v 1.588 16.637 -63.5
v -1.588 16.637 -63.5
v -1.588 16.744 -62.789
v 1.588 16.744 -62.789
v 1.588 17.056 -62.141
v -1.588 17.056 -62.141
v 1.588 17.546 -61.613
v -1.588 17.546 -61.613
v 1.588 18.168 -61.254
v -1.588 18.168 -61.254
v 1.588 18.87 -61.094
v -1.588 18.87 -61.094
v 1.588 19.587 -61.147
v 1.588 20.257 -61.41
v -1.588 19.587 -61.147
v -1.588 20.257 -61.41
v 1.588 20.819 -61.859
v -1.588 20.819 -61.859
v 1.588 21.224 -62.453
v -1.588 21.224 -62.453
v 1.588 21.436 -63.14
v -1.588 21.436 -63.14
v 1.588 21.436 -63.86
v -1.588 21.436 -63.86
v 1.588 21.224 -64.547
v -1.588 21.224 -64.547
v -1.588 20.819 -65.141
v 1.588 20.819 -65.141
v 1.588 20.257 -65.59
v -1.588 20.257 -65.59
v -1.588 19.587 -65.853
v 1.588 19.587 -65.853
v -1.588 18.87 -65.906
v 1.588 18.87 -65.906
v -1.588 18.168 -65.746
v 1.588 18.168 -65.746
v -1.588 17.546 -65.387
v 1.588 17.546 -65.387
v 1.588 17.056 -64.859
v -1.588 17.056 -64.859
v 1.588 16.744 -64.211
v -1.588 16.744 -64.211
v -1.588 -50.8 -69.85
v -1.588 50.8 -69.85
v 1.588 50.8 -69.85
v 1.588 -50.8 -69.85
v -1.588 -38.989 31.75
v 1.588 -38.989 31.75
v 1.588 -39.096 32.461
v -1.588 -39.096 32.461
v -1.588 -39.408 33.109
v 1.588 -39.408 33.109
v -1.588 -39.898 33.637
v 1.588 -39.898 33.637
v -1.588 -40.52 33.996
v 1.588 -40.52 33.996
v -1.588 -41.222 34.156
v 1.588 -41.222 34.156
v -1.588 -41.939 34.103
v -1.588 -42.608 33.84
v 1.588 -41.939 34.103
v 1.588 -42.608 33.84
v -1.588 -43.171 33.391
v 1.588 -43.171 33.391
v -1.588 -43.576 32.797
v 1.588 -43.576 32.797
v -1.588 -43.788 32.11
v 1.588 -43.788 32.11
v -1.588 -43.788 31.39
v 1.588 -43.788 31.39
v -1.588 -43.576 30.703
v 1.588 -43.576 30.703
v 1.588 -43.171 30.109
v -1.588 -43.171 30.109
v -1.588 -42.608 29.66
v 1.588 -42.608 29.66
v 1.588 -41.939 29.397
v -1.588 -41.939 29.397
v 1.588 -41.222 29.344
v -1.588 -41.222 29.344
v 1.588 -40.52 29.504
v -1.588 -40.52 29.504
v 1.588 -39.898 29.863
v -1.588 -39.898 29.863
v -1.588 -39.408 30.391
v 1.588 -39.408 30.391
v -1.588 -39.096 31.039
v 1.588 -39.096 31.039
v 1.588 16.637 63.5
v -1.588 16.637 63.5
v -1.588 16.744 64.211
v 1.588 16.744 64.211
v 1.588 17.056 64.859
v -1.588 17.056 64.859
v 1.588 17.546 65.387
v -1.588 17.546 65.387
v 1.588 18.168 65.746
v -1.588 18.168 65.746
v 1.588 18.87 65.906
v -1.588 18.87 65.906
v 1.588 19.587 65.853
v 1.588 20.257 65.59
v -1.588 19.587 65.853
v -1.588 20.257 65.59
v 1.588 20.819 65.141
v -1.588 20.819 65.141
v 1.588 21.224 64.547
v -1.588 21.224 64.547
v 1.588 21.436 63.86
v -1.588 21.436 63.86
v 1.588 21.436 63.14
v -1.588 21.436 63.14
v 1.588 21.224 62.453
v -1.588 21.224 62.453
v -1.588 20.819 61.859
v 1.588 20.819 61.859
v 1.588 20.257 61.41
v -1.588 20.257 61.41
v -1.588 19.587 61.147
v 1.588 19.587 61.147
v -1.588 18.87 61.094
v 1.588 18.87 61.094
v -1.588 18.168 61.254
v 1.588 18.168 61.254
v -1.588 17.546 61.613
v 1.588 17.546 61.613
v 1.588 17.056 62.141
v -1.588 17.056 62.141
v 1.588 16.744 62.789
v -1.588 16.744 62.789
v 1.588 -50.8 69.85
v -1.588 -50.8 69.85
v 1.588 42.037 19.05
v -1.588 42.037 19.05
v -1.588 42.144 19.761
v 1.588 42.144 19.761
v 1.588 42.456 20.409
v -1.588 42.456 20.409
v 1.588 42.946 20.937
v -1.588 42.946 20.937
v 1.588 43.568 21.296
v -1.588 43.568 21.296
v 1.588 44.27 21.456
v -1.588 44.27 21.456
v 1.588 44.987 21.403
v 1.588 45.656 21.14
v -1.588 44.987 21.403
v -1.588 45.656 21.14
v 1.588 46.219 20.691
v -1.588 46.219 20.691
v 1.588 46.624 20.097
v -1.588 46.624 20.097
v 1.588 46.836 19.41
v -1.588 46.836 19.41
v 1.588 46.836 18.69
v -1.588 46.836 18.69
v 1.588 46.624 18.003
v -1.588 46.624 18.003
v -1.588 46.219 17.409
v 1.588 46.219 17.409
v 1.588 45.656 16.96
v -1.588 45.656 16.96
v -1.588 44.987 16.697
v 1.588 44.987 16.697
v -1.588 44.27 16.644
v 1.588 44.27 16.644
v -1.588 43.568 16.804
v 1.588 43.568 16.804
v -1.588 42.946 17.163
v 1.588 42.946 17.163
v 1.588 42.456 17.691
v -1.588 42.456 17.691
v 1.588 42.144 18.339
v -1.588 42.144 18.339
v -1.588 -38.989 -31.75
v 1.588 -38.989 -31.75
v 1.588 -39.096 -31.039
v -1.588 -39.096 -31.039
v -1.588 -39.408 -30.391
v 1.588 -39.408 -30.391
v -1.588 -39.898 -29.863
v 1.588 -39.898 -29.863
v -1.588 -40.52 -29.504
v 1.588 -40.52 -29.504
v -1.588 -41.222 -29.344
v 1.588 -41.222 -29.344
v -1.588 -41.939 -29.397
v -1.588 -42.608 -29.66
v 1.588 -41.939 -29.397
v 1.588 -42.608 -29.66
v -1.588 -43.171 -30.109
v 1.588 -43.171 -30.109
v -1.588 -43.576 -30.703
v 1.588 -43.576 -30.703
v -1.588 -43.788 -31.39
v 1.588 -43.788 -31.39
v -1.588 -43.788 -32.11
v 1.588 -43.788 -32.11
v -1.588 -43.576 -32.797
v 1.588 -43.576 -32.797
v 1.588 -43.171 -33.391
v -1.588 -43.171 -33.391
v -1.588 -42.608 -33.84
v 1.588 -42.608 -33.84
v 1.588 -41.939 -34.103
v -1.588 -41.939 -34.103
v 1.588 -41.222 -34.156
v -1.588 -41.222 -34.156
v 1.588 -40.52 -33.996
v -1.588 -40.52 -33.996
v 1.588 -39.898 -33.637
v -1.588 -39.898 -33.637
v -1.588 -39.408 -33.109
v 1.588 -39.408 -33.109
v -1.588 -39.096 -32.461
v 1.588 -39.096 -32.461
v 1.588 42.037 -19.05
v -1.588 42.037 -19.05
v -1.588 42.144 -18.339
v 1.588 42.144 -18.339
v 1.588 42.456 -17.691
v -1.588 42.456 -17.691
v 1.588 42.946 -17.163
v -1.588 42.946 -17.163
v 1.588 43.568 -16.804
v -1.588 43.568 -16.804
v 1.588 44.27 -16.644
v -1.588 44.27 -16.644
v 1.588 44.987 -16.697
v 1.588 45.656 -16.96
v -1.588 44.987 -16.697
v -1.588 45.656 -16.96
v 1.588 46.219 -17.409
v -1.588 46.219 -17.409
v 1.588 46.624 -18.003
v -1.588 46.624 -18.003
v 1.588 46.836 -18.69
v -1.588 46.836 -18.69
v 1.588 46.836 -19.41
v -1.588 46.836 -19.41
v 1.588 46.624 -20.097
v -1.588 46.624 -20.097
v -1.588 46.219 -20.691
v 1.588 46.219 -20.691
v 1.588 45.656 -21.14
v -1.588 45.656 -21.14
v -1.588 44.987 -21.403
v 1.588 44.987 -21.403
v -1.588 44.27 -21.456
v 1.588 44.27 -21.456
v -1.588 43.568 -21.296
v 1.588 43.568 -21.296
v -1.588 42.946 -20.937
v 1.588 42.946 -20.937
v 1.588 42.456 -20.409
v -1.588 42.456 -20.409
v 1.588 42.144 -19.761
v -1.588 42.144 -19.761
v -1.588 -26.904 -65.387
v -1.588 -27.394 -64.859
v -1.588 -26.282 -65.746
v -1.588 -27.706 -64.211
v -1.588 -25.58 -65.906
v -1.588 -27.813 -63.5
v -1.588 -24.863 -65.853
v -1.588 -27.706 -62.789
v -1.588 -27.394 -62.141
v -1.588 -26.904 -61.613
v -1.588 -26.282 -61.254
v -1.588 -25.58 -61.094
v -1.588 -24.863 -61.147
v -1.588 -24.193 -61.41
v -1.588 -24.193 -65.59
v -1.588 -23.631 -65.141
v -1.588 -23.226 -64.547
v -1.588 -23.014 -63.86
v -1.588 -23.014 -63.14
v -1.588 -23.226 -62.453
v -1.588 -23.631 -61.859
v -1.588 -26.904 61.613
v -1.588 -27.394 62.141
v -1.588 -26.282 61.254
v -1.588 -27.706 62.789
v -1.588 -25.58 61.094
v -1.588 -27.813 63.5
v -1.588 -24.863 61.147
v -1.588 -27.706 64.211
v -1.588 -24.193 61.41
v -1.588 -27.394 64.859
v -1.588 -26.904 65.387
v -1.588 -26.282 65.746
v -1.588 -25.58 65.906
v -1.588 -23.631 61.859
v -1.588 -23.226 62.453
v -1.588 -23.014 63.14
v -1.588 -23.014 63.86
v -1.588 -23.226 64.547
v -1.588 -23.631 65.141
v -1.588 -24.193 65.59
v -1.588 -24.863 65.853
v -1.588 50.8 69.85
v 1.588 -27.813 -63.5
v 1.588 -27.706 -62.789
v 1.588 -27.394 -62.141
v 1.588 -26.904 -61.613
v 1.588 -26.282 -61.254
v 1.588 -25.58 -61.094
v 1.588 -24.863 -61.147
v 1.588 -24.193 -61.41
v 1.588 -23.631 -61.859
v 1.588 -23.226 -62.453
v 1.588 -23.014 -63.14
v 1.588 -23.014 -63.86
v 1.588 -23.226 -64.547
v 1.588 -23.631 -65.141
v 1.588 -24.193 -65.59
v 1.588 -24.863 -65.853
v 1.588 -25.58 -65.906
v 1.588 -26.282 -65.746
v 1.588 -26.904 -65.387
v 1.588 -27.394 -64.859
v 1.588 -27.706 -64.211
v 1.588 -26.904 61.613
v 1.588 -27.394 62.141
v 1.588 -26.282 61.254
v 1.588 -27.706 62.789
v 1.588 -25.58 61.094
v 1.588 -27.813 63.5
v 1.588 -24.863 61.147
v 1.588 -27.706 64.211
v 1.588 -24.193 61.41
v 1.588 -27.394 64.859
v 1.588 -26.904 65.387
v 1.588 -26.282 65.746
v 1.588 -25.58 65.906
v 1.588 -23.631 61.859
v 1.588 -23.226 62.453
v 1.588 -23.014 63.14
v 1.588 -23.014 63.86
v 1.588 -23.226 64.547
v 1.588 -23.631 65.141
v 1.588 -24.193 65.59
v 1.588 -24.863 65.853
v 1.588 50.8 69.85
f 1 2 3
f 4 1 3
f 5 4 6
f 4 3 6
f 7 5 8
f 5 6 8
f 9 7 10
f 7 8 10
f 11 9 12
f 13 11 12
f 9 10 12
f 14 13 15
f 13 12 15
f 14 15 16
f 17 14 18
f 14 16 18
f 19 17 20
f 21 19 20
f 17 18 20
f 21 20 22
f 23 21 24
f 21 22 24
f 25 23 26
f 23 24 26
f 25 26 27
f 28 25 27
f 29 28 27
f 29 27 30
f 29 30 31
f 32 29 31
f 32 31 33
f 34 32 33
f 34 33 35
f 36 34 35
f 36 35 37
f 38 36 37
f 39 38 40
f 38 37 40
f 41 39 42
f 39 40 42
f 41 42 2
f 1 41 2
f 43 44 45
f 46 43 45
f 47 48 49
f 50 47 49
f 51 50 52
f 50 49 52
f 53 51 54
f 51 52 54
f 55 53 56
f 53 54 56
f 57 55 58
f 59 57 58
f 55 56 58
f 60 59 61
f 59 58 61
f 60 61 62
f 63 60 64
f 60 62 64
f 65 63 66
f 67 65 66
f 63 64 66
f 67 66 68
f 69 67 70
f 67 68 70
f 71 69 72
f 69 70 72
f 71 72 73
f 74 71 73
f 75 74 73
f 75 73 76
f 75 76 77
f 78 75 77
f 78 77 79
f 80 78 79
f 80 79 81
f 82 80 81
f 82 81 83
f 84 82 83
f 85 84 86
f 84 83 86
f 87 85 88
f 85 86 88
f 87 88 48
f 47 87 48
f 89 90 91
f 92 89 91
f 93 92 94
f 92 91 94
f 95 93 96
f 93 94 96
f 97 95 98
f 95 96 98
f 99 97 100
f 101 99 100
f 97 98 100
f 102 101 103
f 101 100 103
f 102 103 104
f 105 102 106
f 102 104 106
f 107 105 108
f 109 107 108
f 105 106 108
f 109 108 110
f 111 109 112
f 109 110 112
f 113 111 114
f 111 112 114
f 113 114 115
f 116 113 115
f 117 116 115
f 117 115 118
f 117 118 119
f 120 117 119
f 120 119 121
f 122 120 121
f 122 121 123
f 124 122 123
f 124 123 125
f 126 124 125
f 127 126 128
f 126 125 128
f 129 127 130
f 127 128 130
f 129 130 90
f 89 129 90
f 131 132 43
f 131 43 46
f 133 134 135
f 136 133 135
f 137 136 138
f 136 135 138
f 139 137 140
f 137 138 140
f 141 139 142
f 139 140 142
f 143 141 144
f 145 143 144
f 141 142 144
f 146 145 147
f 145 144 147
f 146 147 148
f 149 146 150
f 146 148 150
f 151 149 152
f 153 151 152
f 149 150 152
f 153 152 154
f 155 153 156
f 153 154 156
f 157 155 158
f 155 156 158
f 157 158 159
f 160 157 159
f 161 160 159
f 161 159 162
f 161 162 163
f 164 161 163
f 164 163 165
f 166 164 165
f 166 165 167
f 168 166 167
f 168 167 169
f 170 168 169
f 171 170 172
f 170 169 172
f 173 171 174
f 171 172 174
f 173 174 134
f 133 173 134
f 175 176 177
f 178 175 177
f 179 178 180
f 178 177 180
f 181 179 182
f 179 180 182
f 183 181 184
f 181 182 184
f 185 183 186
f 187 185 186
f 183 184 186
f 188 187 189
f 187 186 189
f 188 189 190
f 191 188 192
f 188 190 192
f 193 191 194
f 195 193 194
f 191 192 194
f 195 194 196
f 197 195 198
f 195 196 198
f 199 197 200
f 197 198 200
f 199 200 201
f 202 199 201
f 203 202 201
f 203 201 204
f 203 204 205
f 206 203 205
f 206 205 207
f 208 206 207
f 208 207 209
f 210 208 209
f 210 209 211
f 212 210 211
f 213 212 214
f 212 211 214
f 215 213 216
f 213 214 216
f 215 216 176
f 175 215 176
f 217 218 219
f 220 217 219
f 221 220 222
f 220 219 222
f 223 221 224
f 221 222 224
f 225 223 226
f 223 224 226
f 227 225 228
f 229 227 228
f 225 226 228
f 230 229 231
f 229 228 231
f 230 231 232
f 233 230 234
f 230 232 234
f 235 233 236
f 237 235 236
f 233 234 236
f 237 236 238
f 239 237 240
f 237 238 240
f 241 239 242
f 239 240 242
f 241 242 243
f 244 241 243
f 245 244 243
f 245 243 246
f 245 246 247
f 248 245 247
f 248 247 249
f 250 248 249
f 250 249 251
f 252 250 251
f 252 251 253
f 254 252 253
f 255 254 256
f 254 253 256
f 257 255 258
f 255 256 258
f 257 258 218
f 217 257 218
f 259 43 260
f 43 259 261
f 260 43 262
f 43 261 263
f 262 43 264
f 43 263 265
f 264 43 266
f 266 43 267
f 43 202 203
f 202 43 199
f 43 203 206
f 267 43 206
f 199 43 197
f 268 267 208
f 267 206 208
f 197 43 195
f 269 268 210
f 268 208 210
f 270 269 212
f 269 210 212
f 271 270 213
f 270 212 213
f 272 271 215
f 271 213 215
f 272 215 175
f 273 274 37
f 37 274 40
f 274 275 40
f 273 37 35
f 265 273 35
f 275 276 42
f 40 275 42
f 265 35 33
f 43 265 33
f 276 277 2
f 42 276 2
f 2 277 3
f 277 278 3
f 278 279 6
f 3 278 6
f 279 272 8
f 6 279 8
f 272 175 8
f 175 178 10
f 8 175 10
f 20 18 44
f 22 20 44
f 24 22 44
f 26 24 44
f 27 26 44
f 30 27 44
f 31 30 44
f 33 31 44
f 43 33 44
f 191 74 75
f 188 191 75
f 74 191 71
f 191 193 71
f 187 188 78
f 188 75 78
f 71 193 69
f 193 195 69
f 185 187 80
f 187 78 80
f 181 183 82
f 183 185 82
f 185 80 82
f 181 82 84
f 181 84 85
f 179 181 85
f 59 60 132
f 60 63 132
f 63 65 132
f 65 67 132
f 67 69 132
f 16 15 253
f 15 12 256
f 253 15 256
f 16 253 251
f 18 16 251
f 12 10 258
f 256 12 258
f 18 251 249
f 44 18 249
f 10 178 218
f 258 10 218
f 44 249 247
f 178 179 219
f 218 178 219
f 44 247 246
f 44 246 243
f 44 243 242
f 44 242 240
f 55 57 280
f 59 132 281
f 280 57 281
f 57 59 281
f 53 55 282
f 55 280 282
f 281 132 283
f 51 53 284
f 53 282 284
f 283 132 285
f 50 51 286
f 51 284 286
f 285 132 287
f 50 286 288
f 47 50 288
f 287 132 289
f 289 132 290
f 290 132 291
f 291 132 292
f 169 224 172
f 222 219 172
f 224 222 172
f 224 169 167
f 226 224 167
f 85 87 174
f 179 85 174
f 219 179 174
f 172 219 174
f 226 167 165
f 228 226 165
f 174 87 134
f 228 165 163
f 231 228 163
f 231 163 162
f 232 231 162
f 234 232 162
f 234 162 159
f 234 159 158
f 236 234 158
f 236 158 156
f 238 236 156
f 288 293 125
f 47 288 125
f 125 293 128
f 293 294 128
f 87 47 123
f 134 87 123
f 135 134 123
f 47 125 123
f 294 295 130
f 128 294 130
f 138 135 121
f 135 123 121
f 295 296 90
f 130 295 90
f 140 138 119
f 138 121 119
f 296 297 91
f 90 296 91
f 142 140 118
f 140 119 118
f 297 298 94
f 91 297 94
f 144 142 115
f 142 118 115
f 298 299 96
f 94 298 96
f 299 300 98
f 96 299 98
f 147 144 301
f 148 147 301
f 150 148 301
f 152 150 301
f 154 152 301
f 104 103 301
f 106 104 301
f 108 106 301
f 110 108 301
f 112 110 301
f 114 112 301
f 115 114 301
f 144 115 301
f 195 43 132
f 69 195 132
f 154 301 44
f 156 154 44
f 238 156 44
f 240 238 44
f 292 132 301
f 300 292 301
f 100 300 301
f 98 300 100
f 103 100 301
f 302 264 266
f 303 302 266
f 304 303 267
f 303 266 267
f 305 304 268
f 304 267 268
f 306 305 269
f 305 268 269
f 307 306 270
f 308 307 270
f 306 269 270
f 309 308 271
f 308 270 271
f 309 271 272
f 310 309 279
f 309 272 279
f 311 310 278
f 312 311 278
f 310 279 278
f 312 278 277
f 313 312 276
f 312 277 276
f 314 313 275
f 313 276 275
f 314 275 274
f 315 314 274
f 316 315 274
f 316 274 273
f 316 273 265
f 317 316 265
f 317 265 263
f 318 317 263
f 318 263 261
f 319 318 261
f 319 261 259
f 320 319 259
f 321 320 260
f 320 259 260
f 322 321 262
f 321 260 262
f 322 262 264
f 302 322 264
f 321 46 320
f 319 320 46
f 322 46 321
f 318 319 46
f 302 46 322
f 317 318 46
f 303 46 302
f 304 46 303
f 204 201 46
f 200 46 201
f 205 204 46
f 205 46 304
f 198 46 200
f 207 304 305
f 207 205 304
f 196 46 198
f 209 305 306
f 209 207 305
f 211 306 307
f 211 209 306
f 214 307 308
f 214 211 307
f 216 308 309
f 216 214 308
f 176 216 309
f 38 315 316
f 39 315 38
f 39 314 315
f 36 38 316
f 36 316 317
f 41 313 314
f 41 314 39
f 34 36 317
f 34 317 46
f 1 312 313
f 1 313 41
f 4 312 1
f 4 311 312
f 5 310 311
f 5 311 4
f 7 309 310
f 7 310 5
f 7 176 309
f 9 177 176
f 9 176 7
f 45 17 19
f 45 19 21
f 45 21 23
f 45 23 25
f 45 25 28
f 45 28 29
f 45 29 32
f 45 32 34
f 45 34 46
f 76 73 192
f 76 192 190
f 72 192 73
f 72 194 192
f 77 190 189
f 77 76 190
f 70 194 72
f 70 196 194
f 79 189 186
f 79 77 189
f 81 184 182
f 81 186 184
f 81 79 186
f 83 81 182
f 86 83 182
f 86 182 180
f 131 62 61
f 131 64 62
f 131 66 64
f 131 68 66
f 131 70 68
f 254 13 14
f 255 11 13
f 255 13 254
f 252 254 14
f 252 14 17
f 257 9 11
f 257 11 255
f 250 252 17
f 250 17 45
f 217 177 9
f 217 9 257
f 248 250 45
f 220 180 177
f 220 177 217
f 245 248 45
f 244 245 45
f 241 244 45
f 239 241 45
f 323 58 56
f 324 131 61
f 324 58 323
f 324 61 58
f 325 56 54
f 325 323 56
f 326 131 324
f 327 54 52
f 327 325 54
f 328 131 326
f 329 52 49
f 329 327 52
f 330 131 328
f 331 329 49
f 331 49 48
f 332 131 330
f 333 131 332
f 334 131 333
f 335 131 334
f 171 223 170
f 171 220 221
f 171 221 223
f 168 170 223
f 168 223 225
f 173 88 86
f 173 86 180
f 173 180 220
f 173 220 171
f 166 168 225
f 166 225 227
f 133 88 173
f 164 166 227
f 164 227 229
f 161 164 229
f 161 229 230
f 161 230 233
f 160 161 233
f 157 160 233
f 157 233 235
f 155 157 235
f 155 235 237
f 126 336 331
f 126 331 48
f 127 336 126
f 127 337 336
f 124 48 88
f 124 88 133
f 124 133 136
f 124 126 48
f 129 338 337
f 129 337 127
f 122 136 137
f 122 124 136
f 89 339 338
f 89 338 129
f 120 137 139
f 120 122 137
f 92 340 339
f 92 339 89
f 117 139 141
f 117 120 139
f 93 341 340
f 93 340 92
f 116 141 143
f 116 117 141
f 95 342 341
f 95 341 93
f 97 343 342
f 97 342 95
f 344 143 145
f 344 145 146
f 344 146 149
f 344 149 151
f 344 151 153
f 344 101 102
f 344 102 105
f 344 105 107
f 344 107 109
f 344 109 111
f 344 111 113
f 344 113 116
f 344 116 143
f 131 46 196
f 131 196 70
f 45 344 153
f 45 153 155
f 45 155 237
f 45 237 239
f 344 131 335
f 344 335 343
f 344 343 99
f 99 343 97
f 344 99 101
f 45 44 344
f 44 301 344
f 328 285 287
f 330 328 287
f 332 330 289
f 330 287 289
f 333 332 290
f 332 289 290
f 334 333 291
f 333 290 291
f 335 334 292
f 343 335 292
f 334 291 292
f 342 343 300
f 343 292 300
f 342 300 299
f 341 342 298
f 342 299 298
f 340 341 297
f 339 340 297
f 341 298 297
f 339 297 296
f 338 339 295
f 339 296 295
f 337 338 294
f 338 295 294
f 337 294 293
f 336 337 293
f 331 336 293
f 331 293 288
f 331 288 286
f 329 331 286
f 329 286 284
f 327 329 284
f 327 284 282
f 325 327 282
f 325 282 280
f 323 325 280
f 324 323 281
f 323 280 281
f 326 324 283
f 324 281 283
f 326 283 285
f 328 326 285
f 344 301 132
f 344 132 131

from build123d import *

# Parameters (mm, degrees)
F0_W     = 3.175
F0_H     = 101.6
F1_DEPTH = 69.85
F2_R     = 2.413
F3_DEPTH = 3.175
F4_R     = 2.413
F5_DEPTH = 3.175
F6_R     = 2.413
F7_DEPTH = 3.175
F8_R     = 2.413
F9_DEPTH = 3.175


with BuildPart() as f1:
    # F0 (on Top) → F1 (new body, symmetric)
    with BuildSketch(Plane.XY):
        Rectangle(F0_W, F0_H)
    extrude(amount=F1_DEPTH, both=True)

    # F2 (on face) → F3 (cut, through all)
    with BuildSketch(Plane(origin=(-1.5875, 0, 0), x_dir=(0, -1, 0), z_dir=(-1, 0, 0))):
        with Locations((-44.45, -19.05)):
            Circle(F2_R)
        with Locations((-44.45, 19.05)):
            Circle(F2_R)
    extrude(amount=-F3_DEPTH, mode=Mode.SUBTRACT)

    # F4 (on face) → F5 (cut, through all)
    with BuildSketch(Plane(origin=(-1.5875, 0, 0), x_dir=(0, -1, 0), z_dir=(-1, 0, 0))):
        with Locations((-19.05, -63.5)):
            Circle(F4_R)
        with Locations((-19.05, 63.5)):
            Circle(F4_R)
    extrude(amount=-F5_DEPTH, mode=Mode.SUBTRACT)

    # F6 (on face) → F7 (cut, through all)
    with BuildSketch(Plane(origin=(-1.5875, 0, 0), x_dir=(0, -1, 0), z_dir=(-1, 0, 0))):
        with Locations((25.4, -63.5)):
            Circle(F6_R)
        with Locations((25.4, 63.5)):
            Circle(F6_R)
    extrude(amount=-F7_DEPTH, mode=Mode.SUBTRACT)

    # F8 (on face) → F9 (cut, through all)
    with BuildSketch(Plane.YZ.offset(1.5875)):
        with Locations((-41.402, 31.75)):
            Circle(F8_R)
        with Locations((-41.402, -31.75)):
            Circle(F8_R)
    extrude(amount=-F9_DEPTH, mode=Mode.SUBTRACT)


solid = f1.part
